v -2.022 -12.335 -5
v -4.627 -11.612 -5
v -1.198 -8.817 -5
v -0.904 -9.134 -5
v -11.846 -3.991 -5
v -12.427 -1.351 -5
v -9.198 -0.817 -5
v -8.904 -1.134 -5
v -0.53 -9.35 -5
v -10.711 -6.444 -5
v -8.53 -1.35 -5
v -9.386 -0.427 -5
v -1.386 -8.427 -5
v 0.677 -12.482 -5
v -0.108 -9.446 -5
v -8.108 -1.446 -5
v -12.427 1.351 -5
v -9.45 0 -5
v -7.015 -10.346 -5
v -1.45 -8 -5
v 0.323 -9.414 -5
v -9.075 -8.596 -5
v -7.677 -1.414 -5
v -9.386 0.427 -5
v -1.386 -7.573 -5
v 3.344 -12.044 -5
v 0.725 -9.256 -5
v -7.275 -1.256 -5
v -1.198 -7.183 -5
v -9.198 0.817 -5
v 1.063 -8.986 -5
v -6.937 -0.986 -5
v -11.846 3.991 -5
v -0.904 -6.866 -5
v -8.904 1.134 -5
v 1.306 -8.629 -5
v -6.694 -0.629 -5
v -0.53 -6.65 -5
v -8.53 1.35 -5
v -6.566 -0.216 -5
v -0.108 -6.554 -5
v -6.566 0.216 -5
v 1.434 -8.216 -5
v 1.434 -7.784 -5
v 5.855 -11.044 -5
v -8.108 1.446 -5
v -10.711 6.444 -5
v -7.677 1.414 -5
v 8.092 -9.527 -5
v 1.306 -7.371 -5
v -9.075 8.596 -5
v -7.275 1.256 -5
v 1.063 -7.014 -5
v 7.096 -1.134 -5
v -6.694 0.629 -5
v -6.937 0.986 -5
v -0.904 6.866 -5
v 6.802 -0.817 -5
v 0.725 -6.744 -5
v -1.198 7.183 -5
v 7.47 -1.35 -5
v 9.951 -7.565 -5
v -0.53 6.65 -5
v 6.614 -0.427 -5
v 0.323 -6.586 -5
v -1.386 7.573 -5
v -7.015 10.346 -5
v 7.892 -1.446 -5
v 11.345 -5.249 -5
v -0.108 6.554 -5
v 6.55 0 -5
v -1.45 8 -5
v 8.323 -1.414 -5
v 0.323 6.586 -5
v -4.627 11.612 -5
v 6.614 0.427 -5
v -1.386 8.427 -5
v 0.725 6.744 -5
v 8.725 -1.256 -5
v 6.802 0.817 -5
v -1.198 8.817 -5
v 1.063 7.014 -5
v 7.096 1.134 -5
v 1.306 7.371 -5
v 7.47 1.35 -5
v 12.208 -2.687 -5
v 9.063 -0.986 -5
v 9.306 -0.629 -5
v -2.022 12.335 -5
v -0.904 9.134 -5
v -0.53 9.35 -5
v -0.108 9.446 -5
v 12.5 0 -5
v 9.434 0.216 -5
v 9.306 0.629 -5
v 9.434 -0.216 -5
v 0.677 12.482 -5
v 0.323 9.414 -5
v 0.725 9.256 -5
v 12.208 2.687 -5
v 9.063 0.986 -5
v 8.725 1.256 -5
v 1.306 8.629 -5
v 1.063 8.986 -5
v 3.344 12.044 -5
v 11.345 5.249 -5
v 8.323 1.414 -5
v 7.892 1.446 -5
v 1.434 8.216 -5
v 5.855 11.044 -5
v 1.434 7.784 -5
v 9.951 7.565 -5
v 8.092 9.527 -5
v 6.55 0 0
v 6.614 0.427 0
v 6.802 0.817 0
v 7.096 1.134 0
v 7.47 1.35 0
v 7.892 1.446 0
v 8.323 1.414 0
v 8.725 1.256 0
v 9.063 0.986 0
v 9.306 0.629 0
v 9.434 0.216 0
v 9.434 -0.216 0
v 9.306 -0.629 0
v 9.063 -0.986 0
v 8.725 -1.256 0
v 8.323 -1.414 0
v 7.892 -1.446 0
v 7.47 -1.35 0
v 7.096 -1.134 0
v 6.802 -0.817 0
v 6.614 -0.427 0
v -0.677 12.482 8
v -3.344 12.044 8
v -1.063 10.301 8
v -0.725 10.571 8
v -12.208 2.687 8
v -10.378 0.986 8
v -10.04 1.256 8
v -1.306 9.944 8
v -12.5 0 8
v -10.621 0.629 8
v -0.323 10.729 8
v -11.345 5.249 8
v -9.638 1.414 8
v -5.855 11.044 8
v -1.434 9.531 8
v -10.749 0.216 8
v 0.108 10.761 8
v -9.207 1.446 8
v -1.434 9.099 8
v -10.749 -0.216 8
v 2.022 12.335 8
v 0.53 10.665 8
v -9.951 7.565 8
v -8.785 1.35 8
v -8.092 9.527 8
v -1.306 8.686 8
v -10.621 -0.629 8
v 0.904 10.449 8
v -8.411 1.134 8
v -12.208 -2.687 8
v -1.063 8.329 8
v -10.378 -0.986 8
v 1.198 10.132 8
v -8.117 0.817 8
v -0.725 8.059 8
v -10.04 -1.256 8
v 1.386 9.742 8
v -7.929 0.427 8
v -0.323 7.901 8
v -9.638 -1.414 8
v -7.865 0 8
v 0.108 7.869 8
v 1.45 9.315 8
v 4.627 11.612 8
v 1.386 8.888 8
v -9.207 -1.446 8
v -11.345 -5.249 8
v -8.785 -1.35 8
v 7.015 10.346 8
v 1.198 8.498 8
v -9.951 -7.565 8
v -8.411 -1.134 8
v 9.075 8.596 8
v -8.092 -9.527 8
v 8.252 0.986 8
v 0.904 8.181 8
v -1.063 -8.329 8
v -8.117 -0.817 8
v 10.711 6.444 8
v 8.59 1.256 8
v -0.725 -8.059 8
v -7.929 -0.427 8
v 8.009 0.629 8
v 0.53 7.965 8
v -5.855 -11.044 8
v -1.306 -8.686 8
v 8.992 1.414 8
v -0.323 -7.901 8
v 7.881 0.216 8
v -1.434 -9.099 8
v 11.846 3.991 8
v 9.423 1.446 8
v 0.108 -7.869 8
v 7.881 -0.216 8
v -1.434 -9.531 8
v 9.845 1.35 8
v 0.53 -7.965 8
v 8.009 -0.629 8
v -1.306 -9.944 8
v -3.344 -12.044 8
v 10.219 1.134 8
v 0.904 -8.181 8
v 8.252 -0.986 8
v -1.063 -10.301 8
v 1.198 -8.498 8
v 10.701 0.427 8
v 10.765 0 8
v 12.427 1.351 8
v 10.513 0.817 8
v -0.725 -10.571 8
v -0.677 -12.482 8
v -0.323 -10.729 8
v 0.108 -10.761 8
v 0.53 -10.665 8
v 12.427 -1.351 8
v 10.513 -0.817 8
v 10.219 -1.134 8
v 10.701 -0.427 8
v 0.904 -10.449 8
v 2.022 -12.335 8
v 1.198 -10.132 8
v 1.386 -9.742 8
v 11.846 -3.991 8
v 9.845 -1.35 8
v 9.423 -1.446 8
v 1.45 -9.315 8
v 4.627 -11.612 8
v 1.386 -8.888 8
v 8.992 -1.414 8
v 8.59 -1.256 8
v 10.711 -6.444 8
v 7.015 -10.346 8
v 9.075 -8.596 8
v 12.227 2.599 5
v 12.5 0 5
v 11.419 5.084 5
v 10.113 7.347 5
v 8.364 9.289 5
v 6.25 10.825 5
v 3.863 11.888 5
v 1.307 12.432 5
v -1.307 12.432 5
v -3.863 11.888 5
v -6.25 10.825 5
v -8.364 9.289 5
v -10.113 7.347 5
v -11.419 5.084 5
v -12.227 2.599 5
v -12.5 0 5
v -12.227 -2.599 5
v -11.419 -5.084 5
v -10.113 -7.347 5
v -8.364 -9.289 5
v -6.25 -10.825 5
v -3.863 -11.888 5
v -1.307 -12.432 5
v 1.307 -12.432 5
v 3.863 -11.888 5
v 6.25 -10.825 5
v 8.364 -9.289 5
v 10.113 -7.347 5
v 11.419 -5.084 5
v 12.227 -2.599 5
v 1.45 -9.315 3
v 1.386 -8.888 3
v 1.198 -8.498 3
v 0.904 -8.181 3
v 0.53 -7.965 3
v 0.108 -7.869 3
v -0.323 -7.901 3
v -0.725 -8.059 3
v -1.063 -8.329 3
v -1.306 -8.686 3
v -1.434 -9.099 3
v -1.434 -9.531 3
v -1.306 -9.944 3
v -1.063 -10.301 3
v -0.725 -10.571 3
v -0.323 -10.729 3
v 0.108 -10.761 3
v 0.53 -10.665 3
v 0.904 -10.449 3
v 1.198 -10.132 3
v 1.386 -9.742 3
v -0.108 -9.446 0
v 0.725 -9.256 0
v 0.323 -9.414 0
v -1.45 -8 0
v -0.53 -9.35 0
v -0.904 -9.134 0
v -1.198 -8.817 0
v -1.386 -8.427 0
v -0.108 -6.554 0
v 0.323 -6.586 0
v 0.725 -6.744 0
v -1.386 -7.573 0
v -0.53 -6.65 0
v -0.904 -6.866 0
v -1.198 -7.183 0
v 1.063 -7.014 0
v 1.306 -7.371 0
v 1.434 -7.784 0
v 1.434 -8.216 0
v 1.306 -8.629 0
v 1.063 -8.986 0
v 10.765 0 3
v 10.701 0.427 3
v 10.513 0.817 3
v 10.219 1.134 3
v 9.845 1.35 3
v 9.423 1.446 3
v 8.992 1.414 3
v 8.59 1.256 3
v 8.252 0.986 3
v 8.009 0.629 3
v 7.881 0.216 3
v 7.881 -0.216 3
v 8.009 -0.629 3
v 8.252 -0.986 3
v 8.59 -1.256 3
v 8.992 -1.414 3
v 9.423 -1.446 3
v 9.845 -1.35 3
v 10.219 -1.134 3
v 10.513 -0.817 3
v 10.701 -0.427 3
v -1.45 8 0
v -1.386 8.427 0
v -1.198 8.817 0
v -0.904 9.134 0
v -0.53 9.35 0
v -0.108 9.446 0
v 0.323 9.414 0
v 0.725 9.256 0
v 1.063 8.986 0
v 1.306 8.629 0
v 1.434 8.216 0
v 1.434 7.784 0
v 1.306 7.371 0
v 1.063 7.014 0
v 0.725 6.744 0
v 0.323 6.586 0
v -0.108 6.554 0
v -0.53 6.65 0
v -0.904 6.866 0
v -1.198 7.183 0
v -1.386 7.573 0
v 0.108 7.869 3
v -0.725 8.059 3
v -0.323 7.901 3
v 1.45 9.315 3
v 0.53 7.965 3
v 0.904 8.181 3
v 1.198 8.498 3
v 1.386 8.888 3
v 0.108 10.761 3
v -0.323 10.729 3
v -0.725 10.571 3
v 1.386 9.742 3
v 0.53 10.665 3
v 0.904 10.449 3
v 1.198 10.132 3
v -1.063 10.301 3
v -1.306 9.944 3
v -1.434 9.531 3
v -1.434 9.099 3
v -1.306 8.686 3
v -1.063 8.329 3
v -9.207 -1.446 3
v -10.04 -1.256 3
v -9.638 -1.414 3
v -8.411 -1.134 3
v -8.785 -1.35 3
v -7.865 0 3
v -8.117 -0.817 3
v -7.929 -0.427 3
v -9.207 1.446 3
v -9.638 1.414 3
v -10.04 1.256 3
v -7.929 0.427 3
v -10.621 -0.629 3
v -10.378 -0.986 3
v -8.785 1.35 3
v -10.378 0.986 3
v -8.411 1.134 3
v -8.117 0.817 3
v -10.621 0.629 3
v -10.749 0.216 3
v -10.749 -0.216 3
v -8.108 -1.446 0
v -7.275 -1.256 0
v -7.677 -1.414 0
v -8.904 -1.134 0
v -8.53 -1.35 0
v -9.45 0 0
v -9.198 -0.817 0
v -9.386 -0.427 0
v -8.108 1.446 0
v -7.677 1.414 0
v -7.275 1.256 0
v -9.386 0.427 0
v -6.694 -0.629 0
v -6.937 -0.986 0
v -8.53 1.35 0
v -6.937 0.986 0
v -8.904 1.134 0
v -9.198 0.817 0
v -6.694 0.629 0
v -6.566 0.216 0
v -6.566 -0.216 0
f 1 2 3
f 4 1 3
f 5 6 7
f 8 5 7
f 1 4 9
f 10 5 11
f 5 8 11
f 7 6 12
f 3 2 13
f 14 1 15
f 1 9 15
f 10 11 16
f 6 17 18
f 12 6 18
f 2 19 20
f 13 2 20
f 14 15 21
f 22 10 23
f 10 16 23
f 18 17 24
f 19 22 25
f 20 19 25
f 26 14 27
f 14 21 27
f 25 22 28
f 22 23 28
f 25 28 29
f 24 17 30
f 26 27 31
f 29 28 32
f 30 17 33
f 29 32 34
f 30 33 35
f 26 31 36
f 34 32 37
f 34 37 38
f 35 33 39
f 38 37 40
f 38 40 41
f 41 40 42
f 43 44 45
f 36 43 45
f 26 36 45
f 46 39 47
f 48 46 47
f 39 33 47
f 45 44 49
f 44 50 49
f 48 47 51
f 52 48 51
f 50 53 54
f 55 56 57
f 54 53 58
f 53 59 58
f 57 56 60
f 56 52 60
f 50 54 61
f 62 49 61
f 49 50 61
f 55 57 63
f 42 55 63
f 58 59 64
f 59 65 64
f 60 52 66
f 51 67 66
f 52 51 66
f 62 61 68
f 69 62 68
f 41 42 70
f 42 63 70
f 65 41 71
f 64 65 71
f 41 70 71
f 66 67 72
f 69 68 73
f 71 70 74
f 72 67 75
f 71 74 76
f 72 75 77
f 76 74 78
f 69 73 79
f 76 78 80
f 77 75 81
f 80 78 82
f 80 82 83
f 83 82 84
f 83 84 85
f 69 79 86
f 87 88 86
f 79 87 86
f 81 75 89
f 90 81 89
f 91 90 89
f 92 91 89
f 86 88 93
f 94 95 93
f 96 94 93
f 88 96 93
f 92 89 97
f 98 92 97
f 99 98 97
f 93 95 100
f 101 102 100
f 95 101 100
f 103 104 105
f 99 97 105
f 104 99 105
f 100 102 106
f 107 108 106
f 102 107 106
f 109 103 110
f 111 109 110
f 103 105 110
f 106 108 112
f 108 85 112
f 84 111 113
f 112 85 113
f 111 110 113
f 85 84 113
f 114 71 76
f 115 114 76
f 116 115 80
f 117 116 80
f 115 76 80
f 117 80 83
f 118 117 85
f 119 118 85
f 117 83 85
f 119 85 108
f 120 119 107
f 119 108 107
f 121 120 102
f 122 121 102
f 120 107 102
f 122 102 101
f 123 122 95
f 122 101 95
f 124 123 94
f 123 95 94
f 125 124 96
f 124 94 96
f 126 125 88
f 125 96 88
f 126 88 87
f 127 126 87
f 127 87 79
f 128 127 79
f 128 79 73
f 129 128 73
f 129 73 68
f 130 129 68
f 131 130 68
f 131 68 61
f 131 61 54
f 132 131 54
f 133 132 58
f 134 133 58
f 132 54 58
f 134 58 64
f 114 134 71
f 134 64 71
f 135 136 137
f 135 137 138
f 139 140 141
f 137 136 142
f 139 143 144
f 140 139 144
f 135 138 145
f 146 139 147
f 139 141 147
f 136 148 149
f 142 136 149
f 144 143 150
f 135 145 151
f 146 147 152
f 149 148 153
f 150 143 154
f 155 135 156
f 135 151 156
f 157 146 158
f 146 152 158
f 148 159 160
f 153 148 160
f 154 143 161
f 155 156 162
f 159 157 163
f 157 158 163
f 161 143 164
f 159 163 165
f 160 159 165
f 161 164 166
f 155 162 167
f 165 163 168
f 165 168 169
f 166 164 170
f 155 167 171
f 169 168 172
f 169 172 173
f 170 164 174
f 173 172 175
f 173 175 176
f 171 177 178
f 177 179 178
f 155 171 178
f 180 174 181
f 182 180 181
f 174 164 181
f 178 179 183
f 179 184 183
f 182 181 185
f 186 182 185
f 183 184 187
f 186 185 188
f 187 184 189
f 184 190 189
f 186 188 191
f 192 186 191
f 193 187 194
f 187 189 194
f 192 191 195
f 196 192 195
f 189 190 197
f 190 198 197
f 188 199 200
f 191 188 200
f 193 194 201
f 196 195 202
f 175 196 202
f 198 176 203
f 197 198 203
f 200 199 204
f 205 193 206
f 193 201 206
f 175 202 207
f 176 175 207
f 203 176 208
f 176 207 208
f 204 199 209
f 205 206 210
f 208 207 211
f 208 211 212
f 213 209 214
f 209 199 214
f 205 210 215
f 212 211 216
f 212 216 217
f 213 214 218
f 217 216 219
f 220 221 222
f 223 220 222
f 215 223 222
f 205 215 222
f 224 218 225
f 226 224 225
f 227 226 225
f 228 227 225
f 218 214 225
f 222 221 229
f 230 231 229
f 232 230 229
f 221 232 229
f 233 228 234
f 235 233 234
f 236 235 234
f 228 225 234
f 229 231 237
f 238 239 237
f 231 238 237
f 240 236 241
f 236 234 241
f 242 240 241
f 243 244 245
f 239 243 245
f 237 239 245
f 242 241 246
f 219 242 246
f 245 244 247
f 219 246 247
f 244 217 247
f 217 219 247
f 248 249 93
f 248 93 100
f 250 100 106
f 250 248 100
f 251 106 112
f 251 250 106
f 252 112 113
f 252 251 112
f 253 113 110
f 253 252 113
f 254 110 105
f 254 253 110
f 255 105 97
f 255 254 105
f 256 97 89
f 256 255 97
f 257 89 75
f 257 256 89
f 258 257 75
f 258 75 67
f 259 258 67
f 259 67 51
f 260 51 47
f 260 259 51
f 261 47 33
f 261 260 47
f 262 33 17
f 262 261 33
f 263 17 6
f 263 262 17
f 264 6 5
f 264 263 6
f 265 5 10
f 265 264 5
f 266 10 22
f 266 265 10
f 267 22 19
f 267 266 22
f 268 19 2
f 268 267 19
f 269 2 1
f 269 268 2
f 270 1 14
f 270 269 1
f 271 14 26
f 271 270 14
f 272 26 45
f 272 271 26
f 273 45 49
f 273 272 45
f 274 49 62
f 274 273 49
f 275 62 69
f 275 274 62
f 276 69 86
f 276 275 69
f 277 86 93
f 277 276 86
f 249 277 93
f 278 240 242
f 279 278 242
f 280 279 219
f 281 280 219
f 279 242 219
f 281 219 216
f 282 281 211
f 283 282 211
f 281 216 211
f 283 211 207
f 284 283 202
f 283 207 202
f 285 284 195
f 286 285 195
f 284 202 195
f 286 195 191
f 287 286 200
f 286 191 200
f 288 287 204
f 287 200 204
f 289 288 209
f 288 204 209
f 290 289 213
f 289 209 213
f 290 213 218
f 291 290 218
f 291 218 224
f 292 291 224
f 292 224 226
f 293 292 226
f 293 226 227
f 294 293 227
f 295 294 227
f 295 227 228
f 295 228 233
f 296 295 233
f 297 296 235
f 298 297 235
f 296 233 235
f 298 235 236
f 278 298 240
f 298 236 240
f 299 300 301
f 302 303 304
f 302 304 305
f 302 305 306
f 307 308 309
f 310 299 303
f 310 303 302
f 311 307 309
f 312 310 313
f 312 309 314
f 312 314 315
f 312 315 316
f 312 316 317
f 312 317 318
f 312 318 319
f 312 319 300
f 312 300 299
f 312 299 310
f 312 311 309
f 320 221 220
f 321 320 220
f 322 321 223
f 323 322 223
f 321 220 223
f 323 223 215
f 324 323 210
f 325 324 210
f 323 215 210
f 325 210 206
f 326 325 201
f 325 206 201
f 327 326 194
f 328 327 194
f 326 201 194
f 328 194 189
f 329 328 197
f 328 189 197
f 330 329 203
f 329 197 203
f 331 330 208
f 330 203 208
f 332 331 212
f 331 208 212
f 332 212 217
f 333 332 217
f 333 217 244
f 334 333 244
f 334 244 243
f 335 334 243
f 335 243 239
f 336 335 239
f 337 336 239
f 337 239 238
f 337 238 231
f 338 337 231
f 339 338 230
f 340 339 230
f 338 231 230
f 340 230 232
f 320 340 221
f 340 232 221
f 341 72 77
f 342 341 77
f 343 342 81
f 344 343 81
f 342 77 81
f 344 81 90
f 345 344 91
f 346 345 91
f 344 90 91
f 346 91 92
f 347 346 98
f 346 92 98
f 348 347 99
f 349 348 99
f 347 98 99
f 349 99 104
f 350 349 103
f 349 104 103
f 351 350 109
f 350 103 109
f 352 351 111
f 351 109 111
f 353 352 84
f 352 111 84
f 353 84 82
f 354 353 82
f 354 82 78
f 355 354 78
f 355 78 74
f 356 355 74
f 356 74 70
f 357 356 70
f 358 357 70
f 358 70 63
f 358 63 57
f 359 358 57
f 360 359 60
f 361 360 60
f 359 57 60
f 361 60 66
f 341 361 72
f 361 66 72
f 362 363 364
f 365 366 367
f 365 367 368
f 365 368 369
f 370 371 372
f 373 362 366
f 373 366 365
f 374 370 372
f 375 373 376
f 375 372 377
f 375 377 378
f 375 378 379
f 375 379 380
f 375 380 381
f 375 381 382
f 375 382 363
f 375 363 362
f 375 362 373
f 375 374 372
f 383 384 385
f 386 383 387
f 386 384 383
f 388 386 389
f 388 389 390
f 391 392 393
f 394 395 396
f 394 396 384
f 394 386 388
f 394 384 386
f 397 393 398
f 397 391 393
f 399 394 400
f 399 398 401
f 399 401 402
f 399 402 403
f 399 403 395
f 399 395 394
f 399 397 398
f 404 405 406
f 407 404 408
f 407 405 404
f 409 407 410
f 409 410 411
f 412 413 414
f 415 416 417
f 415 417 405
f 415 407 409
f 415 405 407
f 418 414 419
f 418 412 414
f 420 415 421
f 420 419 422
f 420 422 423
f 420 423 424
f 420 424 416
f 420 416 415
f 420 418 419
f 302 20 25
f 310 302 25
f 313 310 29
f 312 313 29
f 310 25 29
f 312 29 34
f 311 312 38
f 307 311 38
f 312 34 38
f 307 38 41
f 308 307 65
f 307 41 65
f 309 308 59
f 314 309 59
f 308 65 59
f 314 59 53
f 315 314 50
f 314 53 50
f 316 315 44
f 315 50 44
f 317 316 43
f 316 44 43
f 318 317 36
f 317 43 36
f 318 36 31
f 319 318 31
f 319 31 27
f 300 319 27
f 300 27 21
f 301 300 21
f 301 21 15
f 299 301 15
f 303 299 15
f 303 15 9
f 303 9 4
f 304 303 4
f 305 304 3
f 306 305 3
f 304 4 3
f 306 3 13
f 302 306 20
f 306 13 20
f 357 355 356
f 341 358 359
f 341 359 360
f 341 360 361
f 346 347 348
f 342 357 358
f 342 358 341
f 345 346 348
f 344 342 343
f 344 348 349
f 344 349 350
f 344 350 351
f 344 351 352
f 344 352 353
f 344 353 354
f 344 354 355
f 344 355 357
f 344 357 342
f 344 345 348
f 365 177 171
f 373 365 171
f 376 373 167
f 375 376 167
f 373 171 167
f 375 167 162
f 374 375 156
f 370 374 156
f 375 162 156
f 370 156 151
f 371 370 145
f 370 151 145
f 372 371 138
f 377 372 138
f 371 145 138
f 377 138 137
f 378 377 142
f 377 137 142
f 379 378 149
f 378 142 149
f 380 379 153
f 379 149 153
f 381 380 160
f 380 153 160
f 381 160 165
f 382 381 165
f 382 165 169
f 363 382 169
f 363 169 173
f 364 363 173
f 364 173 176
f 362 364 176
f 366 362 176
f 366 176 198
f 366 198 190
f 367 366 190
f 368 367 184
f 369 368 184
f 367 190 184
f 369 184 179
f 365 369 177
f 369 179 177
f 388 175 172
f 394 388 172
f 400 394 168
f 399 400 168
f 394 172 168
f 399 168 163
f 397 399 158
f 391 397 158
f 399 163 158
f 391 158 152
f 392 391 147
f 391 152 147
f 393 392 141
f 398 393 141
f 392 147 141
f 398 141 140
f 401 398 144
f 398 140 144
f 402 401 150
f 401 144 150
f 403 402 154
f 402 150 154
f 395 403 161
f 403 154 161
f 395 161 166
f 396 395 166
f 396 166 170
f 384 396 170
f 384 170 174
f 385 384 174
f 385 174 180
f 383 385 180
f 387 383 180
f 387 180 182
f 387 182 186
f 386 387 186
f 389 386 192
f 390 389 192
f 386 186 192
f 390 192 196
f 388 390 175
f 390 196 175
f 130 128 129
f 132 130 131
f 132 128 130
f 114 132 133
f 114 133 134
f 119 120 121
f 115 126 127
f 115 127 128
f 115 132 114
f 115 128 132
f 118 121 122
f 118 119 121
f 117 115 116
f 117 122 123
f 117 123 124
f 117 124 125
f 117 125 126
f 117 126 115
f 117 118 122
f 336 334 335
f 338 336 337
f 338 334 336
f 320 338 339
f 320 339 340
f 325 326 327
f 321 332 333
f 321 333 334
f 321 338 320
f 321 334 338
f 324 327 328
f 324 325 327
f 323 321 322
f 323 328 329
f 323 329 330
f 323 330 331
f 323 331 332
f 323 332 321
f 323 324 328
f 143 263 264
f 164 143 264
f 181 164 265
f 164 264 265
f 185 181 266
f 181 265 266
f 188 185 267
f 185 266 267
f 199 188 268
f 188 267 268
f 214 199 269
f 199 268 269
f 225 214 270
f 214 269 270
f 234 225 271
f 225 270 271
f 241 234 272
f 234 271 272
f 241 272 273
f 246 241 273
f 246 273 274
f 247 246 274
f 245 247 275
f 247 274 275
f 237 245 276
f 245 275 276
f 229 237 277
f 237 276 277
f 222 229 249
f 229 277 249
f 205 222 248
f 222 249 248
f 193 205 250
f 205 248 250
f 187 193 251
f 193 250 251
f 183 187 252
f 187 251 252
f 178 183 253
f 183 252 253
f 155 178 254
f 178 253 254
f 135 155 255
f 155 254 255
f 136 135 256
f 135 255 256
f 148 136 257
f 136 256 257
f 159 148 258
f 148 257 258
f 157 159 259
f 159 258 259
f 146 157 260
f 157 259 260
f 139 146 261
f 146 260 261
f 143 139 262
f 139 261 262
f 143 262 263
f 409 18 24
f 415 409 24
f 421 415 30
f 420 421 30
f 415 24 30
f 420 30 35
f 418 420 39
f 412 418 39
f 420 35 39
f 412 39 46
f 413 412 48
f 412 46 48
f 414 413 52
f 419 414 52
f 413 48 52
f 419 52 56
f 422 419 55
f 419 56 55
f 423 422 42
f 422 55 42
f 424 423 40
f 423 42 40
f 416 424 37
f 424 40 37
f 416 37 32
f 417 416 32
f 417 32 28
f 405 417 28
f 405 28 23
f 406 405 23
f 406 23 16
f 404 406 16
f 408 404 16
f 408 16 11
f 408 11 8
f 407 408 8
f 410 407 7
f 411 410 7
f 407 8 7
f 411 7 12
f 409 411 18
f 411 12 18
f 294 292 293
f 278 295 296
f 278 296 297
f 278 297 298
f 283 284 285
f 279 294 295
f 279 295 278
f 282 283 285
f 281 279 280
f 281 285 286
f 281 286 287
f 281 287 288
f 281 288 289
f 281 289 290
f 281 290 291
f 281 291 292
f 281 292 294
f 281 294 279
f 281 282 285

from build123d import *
from build123d.topology import SkipClean

# Parameters (mm, degrees)
SKETCH1_R           = 12.5
BOSS_EXTRUDE1_DEPTH = 5
SKETCH2_W           = 3
SKETCH2_H           = 12.5
SKETCH5_R           = 1.45
CUT_EXTRUDE1_DEPTH  = 5
SKETCH6_R           = 1.45
CUT_EXTRUDE2_DEPTH  = 5


with BuildPart() as part:
    # Sketch1 → Boss-Extrude1 (new, symmetric)
    with BuildSketch(Plane.XY):
        Circle(SKETCH1_R)
    extrude(amount=BOSS_EXTRUDE1_DEPTH, both=True)

    # Sketch2 → Revolve1 (revolve)
    with SkipClean():  # the faces are left unmerged after this step: merging them gives an invalid solid
        with BuildSketch(Plane(origin=(0, 0, 0), x_dir=(0, 0, -1), z_dir=(1, 0, 0)), mode=Mode.PRIVATE) as revolve1_sk:
            with Locations((-6.5, 6.25)):
                Rectangle(SKETCH2_W, SKETCH2_H)
        revolve(revolve1_sk.sketch.rotate(Axis((0, 0, 0), (0, 0, 1)), 90), axis=Axis((0, 0, 0), (0, 0, 1)))

    # Sketch5 → Cut-Extrude1 (cut)
    with SkipClean():  # the faces are left unmerged after this step: merging them gives an invalid solid
        with BuildSketch(Plane.XY.offset(8)):
            with Locations((0, 9.315)):
                Circle(SKETCH5_R)
            with Locations((9.315, 0)):
                Circle(SKETCH5_R)
            with Locations((0, -9.315)):
                Circle(SKETCH5_R)
            with Locations((-9.315, 0)):
                Circle(SKETCH5_R)
        extrude(amount=-CUT_EXTRUDE1_DEPTH, mode=Mode.SUBTRACT)

    # Sketch6 → Cut-Extrude2 (cut)
    with SkipClean():  # the faces are left unmerged after this step: merging them gives an invalid solid
        with BuildSketch(Plane(origin=(0, 0, -5), x_dir=(-1, 0, 0), z_dir=(0, 0, -1))):
            with Locations((0, 8)):
                Circle(SKETCH6_R)
            with Locations((8, 0)):
                Circle(SKETCH6_R)
            with Locations((0, -8)):
                Circle(SKETCH6_R)
            with Locations((-8, 0)):
                Circle(SKETCH6_R)
        extrude(amount=-CUT_EXTRUDE2_DEPTH, mode=Mode.SUBTRACT)


solid = part.part
